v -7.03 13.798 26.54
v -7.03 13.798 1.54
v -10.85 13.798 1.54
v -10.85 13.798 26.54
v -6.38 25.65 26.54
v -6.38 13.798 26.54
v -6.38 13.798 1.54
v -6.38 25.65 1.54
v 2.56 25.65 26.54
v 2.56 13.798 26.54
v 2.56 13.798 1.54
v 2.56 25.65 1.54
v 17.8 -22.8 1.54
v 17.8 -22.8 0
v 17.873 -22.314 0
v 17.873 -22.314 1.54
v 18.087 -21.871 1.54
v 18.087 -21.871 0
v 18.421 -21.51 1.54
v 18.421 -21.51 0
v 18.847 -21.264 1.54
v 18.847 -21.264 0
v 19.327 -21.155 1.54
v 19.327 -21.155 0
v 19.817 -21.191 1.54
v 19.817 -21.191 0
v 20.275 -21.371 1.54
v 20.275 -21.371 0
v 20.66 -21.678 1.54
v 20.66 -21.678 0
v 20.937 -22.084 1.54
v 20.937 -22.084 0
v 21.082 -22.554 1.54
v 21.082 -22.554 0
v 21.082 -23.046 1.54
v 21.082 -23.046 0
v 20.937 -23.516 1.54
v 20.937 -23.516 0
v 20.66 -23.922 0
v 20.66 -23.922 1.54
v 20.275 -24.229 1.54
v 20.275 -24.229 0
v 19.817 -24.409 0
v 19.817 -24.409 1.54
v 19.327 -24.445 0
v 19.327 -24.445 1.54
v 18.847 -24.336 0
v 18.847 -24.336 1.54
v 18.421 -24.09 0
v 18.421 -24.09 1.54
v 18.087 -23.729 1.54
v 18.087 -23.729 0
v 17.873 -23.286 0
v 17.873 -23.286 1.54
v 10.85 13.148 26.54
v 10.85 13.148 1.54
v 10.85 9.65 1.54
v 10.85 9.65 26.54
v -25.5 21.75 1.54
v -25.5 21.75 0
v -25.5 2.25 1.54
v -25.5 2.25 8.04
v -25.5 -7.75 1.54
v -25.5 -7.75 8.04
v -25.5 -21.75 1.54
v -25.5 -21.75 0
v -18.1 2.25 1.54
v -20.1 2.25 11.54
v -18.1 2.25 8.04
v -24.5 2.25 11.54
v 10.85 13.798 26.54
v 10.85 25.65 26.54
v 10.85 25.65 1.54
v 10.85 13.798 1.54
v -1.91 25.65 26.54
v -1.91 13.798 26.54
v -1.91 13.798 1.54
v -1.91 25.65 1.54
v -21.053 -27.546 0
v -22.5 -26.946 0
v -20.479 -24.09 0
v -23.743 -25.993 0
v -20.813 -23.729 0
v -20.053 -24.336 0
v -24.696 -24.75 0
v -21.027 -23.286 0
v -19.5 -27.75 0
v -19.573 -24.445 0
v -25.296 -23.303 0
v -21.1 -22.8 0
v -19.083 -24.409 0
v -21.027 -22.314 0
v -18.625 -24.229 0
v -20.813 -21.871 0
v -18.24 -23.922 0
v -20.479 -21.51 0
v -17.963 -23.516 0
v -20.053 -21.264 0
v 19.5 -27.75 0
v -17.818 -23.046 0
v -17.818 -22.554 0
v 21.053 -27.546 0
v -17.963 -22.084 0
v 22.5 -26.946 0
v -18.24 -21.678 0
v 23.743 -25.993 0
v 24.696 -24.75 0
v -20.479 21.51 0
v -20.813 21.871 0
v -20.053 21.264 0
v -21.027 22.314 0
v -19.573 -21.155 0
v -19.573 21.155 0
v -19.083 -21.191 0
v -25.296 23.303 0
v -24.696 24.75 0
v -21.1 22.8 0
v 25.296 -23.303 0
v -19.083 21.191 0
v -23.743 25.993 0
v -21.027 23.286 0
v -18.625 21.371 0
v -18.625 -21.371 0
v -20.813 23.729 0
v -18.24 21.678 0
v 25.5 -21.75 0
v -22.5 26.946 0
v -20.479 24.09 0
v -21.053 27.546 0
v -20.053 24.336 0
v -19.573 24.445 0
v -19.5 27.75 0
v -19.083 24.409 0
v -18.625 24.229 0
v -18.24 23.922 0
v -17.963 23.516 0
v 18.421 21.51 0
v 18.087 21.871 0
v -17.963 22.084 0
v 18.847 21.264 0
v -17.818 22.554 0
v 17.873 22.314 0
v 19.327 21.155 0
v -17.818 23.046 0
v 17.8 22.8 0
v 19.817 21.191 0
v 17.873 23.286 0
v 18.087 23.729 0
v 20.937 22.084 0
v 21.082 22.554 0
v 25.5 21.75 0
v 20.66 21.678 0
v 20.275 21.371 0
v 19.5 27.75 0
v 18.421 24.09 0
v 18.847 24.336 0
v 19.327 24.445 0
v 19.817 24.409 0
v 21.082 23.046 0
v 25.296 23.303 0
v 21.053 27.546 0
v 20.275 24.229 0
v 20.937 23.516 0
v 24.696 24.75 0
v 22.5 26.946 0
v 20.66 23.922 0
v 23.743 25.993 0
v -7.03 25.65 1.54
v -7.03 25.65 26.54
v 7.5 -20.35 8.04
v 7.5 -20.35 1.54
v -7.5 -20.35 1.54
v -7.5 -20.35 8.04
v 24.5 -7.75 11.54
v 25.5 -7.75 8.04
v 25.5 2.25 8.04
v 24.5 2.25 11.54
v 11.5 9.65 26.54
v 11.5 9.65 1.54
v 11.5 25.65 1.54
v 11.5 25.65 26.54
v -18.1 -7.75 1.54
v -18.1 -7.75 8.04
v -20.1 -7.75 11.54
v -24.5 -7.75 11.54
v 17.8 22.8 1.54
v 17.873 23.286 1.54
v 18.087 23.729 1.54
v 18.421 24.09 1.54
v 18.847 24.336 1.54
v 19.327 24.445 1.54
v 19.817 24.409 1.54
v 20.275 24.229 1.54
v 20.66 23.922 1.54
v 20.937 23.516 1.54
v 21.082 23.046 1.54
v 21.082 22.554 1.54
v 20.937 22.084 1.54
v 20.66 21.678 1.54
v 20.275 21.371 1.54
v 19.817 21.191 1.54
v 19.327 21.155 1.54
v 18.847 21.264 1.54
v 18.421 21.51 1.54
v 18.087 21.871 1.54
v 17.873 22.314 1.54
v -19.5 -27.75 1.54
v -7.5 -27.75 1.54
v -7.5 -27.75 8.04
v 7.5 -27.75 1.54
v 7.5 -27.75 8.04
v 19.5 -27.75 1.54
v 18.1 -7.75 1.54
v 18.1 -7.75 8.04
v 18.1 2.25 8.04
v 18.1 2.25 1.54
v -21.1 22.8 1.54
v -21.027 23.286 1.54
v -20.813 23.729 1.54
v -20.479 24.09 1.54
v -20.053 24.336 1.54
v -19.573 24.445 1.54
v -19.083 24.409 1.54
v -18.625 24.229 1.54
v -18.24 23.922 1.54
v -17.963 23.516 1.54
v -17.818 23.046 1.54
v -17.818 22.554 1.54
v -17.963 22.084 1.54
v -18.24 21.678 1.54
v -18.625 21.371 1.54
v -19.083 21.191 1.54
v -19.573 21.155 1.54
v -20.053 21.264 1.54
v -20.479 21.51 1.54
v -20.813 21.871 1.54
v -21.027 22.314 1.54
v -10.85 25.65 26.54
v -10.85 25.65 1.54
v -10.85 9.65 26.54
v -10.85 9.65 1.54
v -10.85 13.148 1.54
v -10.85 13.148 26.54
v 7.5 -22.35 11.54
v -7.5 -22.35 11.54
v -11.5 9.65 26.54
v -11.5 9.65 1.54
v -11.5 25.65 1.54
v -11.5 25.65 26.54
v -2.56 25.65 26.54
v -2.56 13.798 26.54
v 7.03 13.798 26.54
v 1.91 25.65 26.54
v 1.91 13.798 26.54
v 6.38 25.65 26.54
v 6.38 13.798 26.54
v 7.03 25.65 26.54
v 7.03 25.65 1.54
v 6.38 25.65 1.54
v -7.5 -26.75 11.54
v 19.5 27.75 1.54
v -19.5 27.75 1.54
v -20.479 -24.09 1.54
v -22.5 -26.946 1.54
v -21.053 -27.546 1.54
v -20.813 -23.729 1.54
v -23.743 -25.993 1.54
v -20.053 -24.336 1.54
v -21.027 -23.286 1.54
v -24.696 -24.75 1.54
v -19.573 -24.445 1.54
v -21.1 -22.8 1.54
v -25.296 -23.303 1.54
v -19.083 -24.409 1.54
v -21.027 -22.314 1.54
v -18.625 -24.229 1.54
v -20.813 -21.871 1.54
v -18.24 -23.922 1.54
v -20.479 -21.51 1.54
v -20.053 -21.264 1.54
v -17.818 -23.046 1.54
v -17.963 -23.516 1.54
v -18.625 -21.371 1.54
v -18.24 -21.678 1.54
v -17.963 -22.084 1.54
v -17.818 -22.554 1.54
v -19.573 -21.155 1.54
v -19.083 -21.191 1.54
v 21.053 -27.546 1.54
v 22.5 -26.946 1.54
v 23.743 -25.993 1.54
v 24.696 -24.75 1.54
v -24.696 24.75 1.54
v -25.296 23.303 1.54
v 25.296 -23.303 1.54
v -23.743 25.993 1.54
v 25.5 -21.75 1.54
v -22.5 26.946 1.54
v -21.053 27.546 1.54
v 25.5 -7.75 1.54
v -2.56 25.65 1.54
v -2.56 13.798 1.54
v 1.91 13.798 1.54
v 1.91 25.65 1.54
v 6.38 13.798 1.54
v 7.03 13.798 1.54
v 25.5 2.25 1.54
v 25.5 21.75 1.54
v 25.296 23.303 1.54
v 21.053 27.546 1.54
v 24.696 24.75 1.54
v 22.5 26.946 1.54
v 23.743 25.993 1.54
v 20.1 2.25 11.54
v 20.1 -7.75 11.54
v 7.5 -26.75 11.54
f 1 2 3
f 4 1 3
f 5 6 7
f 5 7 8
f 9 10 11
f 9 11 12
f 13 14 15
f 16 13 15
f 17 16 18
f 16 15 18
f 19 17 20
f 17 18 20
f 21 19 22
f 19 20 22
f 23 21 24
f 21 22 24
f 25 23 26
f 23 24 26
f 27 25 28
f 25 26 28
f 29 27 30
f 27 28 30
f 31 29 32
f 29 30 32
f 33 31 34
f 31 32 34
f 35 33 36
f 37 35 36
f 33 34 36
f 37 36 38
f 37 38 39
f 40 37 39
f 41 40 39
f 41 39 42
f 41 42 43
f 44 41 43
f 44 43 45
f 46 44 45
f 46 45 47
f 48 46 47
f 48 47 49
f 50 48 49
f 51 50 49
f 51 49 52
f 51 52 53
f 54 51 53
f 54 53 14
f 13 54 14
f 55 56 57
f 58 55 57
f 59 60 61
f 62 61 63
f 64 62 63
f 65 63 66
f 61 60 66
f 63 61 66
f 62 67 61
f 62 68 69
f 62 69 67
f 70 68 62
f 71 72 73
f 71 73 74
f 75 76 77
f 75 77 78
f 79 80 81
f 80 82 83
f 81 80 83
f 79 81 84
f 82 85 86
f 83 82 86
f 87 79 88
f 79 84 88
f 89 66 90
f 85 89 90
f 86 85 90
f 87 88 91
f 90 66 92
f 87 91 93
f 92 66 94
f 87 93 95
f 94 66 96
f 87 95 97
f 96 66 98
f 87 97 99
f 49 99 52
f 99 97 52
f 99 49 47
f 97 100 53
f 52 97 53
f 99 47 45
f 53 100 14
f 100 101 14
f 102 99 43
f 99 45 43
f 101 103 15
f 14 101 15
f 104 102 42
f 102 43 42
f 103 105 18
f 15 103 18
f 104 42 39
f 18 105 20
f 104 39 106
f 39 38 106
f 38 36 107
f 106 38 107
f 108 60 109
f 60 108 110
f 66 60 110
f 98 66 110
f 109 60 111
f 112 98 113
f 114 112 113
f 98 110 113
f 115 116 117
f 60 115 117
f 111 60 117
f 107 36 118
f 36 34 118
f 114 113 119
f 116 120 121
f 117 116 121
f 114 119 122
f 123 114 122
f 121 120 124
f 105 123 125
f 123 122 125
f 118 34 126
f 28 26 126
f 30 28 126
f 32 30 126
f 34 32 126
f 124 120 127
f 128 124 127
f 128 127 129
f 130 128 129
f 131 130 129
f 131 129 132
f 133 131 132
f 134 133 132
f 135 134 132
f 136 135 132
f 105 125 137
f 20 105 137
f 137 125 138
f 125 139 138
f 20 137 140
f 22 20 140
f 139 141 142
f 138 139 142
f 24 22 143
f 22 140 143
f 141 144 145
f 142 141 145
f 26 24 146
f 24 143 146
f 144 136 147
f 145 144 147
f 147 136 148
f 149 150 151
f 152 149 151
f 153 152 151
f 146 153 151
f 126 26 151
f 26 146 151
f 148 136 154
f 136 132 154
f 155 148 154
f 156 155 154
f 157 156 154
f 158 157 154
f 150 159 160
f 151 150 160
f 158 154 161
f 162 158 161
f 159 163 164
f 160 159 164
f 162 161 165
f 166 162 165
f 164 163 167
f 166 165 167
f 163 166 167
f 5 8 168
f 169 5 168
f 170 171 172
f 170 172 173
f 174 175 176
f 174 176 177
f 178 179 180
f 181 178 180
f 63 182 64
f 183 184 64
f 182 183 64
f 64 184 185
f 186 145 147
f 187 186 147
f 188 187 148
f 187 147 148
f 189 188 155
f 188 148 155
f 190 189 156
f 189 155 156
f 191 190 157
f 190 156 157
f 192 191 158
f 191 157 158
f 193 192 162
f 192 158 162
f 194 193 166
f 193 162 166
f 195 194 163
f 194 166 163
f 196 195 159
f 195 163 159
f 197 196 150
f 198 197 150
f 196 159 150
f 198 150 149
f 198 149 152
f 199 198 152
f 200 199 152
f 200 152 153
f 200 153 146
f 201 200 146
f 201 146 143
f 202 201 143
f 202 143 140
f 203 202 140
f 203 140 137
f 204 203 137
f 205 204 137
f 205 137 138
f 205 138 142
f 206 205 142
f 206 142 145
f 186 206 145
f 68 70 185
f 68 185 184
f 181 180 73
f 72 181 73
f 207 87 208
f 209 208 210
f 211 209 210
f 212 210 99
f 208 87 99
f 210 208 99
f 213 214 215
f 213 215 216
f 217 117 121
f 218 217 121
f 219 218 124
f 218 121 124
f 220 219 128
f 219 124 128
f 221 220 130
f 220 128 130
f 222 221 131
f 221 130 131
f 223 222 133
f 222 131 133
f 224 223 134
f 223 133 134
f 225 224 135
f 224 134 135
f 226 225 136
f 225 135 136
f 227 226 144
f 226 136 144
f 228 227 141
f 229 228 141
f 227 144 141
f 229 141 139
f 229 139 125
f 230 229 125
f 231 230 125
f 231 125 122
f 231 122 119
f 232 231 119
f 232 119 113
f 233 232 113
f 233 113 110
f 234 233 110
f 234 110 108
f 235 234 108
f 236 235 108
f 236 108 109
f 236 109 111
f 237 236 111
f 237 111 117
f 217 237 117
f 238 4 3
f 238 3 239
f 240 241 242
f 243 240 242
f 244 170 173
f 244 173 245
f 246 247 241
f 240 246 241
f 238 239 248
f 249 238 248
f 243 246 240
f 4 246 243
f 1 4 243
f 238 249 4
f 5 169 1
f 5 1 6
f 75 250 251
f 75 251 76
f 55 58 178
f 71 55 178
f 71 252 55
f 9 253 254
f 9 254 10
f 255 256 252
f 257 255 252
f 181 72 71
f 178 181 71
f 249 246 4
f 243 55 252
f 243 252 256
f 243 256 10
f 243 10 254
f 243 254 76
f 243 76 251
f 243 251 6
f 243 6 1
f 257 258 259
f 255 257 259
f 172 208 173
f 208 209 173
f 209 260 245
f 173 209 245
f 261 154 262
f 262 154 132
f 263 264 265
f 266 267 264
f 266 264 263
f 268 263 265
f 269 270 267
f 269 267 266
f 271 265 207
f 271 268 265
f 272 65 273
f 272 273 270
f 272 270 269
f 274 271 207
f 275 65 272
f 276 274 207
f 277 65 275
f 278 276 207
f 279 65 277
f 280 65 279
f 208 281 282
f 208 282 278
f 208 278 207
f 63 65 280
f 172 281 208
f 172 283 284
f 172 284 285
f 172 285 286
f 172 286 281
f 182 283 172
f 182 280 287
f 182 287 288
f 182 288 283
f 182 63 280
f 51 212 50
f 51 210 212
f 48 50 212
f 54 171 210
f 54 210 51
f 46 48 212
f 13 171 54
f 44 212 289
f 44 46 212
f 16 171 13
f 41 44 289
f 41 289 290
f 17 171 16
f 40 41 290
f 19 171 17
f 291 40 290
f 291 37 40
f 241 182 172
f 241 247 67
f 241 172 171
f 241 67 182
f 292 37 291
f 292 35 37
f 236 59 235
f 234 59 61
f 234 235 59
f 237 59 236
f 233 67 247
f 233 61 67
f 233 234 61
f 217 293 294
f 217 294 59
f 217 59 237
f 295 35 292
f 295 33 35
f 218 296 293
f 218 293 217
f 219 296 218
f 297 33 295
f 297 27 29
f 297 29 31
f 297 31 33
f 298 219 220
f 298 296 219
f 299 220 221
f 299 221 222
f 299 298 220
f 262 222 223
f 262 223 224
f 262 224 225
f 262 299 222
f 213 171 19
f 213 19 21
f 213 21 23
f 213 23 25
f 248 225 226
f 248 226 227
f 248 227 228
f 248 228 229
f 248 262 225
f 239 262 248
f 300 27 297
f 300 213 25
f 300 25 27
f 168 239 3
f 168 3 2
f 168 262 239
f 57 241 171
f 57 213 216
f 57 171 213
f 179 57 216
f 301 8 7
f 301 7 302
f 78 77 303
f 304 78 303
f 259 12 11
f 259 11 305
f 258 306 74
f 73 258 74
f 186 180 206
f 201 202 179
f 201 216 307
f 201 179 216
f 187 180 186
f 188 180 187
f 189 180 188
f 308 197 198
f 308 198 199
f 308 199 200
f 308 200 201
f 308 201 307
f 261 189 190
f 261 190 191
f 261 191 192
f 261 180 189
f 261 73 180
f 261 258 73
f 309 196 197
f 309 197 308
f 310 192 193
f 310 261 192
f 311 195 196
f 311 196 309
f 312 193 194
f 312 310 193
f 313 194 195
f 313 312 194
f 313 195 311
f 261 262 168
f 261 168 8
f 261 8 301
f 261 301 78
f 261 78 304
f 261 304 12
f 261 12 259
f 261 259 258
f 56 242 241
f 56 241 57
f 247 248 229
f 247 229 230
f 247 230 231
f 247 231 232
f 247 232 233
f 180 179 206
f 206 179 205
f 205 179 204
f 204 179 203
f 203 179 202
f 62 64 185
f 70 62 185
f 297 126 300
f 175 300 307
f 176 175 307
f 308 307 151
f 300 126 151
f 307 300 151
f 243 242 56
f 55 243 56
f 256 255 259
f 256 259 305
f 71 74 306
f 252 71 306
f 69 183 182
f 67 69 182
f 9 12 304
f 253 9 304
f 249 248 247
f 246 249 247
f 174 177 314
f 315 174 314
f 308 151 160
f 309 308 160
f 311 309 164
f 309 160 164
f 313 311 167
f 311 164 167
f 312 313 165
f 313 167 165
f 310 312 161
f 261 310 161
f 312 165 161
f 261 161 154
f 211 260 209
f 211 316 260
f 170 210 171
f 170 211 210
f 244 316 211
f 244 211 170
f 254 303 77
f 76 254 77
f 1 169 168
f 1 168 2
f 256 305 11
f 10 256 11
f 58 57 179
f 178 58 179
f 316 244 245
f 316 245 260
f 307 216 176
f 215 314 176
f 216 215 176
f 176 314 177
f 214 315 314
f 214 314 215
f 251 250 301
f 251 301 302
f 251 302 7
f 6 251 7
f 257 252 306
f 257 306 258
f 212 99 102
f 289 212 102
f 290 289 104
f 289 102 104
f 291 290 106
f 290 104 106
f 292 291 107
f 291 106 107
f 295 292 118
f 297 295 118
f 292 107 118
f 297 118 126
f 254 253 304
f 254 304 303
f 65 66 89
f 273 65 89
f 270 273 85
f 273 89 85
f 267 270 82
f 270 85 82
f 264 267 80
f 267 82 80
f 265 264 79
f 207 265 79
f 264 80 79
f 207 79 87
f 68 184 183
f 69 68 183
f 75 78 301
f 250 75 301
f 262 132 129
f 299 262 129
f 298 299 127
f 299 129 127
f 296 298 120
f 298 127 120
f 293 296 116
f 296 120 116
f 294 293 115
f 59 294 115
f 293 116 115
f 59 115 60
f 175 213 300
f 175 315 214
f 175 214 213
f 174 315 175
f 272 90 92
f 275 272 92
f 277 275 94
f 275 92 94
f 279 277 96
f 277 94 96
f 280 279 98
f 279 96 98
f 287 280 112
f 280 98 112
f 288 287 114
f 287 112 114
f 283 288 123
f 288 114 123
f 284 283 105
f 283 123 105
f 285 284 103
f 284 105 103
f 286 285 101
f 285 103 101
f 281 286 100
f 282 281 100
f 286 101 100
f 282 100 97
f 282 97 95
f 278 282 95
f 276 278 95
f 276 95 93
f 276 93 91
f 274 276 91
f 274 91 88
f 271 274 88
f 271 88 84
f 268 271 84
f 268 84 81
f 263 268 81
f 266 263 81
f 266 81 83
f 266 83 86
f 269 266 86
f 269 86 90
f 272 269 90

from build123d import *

# Parameters (mm, degrees)
F1_DEPTH  = 1.54
F3_D      = 3.3
F5_DEPTH  = 25
F8_DEPTH  = 10
F10_DEPTH = 7.5


# Not quite as in the source:
# - a pattern or mirror of a feature is missing from the dataset's text; its kind, count and spacing are read off the source's solid


with BuildPart() as f1:
    # F0 (on Top) → F1 (new body)
    with BuildSketch(Plane.XY):
        with BuildLine():
            Line((-19.5, -27.75), (19.5, -27.75))
            ThreePointArc((19.5, -27.75), (23.7426406871, -25.9926406871), (25.5, -21.75))
            Line((25.5, -21.75), (25.5, 21.75))
            ThreePointArc((25.5, 21.75), (23.7426406871, 25.9926406871), (19.5, 27.75))
            Line((19.5, 27.75), (-19.5, 27.75))
            ThreePointArc((-19.5, 27.75), (-23.7426406871, 25.9926406871), (-25.5, 21.75))
            Line((-25.5, 21.75), (-25.5, -21.75))
            ThreePointArc((-25.5, -21.75), (-23.7426406871, -25.9926406871), (-19.5, -27.75))
        make_face()
    extrude(amount=F1_DEPTH)

    # F3 (through all)
    with Locations(Plane.XY.offset(1.54)):
        with Locations((-19.45, 22.8), (19.45, 22.8), (-19.45, -22.8), (19.45, -22.8)):
            Hole(F3_D / 2)

    # F4 (on face) → F5 (join)
    with BuildSketch(Plane.XY.offset(1.54)):
        Polygon((10.85, 9.65), (11.5, 9.65), (11.5, 25.65), (10.85, 25.65), (10.85, 13.7976789847), (7.03, 13.7976789847), (7.03, 25.65), (6.38, 25.65), (6.38, 13.7976789847), (2.56, 13.7976789847), (2.56, 25.65), (1.91, 25.65), (1.91, 13.7976789847), (-1.91, 13.7976789847), (-1.91, 25.65), (-2.56, 25.65), (-2.56, 13.7976789847), (-6.38, 13.7976789847), (-6.38, 25.65), (-7.03, 25.65), (-7.03, 13.7976789847), (-10.85, 13.7976789847), (-10.85, 25.65), (-11.5, 25.65), (-11.5, 9.65), (-10.85, 9.65), (-10.85, 13.1476789847), (10.85, 13.1476789847), align=None)
    extrude(amount=F5_DEPTH)

    # F7 (on offset) → F8 (join)
    with BuildSketch(Plane.XZ.offset(7.75)):
        Polygon((18.1, 1.54), (25.5, 1.54), (25.5, 8.04), (24.5, 11.54), (20.1, 11.54), (18.1, 8.04), align=None)
    f8 = extrude(amount=-F8_DEPTH)

    # F8_copies: F8 across plane
    add(f8.mirror(Plane(origin=(0, 0, 0), x_dir=(0, 0, -1), z_dir=(-1, 0, 0))))

    # F9 (on Right) → F10 (join, symmetric)
    with BuildSketch(Plane.YZ):
        Polygon((-27.75, 1.54), (-20.35, 1.54), (-20.35, 8.04), (-22.35, 11.54), (-26.75, 11.54), (-27.75, 8.04), align=None)
    extrude(amount=F10_DEPTH, both=True)


solid = f1.part
